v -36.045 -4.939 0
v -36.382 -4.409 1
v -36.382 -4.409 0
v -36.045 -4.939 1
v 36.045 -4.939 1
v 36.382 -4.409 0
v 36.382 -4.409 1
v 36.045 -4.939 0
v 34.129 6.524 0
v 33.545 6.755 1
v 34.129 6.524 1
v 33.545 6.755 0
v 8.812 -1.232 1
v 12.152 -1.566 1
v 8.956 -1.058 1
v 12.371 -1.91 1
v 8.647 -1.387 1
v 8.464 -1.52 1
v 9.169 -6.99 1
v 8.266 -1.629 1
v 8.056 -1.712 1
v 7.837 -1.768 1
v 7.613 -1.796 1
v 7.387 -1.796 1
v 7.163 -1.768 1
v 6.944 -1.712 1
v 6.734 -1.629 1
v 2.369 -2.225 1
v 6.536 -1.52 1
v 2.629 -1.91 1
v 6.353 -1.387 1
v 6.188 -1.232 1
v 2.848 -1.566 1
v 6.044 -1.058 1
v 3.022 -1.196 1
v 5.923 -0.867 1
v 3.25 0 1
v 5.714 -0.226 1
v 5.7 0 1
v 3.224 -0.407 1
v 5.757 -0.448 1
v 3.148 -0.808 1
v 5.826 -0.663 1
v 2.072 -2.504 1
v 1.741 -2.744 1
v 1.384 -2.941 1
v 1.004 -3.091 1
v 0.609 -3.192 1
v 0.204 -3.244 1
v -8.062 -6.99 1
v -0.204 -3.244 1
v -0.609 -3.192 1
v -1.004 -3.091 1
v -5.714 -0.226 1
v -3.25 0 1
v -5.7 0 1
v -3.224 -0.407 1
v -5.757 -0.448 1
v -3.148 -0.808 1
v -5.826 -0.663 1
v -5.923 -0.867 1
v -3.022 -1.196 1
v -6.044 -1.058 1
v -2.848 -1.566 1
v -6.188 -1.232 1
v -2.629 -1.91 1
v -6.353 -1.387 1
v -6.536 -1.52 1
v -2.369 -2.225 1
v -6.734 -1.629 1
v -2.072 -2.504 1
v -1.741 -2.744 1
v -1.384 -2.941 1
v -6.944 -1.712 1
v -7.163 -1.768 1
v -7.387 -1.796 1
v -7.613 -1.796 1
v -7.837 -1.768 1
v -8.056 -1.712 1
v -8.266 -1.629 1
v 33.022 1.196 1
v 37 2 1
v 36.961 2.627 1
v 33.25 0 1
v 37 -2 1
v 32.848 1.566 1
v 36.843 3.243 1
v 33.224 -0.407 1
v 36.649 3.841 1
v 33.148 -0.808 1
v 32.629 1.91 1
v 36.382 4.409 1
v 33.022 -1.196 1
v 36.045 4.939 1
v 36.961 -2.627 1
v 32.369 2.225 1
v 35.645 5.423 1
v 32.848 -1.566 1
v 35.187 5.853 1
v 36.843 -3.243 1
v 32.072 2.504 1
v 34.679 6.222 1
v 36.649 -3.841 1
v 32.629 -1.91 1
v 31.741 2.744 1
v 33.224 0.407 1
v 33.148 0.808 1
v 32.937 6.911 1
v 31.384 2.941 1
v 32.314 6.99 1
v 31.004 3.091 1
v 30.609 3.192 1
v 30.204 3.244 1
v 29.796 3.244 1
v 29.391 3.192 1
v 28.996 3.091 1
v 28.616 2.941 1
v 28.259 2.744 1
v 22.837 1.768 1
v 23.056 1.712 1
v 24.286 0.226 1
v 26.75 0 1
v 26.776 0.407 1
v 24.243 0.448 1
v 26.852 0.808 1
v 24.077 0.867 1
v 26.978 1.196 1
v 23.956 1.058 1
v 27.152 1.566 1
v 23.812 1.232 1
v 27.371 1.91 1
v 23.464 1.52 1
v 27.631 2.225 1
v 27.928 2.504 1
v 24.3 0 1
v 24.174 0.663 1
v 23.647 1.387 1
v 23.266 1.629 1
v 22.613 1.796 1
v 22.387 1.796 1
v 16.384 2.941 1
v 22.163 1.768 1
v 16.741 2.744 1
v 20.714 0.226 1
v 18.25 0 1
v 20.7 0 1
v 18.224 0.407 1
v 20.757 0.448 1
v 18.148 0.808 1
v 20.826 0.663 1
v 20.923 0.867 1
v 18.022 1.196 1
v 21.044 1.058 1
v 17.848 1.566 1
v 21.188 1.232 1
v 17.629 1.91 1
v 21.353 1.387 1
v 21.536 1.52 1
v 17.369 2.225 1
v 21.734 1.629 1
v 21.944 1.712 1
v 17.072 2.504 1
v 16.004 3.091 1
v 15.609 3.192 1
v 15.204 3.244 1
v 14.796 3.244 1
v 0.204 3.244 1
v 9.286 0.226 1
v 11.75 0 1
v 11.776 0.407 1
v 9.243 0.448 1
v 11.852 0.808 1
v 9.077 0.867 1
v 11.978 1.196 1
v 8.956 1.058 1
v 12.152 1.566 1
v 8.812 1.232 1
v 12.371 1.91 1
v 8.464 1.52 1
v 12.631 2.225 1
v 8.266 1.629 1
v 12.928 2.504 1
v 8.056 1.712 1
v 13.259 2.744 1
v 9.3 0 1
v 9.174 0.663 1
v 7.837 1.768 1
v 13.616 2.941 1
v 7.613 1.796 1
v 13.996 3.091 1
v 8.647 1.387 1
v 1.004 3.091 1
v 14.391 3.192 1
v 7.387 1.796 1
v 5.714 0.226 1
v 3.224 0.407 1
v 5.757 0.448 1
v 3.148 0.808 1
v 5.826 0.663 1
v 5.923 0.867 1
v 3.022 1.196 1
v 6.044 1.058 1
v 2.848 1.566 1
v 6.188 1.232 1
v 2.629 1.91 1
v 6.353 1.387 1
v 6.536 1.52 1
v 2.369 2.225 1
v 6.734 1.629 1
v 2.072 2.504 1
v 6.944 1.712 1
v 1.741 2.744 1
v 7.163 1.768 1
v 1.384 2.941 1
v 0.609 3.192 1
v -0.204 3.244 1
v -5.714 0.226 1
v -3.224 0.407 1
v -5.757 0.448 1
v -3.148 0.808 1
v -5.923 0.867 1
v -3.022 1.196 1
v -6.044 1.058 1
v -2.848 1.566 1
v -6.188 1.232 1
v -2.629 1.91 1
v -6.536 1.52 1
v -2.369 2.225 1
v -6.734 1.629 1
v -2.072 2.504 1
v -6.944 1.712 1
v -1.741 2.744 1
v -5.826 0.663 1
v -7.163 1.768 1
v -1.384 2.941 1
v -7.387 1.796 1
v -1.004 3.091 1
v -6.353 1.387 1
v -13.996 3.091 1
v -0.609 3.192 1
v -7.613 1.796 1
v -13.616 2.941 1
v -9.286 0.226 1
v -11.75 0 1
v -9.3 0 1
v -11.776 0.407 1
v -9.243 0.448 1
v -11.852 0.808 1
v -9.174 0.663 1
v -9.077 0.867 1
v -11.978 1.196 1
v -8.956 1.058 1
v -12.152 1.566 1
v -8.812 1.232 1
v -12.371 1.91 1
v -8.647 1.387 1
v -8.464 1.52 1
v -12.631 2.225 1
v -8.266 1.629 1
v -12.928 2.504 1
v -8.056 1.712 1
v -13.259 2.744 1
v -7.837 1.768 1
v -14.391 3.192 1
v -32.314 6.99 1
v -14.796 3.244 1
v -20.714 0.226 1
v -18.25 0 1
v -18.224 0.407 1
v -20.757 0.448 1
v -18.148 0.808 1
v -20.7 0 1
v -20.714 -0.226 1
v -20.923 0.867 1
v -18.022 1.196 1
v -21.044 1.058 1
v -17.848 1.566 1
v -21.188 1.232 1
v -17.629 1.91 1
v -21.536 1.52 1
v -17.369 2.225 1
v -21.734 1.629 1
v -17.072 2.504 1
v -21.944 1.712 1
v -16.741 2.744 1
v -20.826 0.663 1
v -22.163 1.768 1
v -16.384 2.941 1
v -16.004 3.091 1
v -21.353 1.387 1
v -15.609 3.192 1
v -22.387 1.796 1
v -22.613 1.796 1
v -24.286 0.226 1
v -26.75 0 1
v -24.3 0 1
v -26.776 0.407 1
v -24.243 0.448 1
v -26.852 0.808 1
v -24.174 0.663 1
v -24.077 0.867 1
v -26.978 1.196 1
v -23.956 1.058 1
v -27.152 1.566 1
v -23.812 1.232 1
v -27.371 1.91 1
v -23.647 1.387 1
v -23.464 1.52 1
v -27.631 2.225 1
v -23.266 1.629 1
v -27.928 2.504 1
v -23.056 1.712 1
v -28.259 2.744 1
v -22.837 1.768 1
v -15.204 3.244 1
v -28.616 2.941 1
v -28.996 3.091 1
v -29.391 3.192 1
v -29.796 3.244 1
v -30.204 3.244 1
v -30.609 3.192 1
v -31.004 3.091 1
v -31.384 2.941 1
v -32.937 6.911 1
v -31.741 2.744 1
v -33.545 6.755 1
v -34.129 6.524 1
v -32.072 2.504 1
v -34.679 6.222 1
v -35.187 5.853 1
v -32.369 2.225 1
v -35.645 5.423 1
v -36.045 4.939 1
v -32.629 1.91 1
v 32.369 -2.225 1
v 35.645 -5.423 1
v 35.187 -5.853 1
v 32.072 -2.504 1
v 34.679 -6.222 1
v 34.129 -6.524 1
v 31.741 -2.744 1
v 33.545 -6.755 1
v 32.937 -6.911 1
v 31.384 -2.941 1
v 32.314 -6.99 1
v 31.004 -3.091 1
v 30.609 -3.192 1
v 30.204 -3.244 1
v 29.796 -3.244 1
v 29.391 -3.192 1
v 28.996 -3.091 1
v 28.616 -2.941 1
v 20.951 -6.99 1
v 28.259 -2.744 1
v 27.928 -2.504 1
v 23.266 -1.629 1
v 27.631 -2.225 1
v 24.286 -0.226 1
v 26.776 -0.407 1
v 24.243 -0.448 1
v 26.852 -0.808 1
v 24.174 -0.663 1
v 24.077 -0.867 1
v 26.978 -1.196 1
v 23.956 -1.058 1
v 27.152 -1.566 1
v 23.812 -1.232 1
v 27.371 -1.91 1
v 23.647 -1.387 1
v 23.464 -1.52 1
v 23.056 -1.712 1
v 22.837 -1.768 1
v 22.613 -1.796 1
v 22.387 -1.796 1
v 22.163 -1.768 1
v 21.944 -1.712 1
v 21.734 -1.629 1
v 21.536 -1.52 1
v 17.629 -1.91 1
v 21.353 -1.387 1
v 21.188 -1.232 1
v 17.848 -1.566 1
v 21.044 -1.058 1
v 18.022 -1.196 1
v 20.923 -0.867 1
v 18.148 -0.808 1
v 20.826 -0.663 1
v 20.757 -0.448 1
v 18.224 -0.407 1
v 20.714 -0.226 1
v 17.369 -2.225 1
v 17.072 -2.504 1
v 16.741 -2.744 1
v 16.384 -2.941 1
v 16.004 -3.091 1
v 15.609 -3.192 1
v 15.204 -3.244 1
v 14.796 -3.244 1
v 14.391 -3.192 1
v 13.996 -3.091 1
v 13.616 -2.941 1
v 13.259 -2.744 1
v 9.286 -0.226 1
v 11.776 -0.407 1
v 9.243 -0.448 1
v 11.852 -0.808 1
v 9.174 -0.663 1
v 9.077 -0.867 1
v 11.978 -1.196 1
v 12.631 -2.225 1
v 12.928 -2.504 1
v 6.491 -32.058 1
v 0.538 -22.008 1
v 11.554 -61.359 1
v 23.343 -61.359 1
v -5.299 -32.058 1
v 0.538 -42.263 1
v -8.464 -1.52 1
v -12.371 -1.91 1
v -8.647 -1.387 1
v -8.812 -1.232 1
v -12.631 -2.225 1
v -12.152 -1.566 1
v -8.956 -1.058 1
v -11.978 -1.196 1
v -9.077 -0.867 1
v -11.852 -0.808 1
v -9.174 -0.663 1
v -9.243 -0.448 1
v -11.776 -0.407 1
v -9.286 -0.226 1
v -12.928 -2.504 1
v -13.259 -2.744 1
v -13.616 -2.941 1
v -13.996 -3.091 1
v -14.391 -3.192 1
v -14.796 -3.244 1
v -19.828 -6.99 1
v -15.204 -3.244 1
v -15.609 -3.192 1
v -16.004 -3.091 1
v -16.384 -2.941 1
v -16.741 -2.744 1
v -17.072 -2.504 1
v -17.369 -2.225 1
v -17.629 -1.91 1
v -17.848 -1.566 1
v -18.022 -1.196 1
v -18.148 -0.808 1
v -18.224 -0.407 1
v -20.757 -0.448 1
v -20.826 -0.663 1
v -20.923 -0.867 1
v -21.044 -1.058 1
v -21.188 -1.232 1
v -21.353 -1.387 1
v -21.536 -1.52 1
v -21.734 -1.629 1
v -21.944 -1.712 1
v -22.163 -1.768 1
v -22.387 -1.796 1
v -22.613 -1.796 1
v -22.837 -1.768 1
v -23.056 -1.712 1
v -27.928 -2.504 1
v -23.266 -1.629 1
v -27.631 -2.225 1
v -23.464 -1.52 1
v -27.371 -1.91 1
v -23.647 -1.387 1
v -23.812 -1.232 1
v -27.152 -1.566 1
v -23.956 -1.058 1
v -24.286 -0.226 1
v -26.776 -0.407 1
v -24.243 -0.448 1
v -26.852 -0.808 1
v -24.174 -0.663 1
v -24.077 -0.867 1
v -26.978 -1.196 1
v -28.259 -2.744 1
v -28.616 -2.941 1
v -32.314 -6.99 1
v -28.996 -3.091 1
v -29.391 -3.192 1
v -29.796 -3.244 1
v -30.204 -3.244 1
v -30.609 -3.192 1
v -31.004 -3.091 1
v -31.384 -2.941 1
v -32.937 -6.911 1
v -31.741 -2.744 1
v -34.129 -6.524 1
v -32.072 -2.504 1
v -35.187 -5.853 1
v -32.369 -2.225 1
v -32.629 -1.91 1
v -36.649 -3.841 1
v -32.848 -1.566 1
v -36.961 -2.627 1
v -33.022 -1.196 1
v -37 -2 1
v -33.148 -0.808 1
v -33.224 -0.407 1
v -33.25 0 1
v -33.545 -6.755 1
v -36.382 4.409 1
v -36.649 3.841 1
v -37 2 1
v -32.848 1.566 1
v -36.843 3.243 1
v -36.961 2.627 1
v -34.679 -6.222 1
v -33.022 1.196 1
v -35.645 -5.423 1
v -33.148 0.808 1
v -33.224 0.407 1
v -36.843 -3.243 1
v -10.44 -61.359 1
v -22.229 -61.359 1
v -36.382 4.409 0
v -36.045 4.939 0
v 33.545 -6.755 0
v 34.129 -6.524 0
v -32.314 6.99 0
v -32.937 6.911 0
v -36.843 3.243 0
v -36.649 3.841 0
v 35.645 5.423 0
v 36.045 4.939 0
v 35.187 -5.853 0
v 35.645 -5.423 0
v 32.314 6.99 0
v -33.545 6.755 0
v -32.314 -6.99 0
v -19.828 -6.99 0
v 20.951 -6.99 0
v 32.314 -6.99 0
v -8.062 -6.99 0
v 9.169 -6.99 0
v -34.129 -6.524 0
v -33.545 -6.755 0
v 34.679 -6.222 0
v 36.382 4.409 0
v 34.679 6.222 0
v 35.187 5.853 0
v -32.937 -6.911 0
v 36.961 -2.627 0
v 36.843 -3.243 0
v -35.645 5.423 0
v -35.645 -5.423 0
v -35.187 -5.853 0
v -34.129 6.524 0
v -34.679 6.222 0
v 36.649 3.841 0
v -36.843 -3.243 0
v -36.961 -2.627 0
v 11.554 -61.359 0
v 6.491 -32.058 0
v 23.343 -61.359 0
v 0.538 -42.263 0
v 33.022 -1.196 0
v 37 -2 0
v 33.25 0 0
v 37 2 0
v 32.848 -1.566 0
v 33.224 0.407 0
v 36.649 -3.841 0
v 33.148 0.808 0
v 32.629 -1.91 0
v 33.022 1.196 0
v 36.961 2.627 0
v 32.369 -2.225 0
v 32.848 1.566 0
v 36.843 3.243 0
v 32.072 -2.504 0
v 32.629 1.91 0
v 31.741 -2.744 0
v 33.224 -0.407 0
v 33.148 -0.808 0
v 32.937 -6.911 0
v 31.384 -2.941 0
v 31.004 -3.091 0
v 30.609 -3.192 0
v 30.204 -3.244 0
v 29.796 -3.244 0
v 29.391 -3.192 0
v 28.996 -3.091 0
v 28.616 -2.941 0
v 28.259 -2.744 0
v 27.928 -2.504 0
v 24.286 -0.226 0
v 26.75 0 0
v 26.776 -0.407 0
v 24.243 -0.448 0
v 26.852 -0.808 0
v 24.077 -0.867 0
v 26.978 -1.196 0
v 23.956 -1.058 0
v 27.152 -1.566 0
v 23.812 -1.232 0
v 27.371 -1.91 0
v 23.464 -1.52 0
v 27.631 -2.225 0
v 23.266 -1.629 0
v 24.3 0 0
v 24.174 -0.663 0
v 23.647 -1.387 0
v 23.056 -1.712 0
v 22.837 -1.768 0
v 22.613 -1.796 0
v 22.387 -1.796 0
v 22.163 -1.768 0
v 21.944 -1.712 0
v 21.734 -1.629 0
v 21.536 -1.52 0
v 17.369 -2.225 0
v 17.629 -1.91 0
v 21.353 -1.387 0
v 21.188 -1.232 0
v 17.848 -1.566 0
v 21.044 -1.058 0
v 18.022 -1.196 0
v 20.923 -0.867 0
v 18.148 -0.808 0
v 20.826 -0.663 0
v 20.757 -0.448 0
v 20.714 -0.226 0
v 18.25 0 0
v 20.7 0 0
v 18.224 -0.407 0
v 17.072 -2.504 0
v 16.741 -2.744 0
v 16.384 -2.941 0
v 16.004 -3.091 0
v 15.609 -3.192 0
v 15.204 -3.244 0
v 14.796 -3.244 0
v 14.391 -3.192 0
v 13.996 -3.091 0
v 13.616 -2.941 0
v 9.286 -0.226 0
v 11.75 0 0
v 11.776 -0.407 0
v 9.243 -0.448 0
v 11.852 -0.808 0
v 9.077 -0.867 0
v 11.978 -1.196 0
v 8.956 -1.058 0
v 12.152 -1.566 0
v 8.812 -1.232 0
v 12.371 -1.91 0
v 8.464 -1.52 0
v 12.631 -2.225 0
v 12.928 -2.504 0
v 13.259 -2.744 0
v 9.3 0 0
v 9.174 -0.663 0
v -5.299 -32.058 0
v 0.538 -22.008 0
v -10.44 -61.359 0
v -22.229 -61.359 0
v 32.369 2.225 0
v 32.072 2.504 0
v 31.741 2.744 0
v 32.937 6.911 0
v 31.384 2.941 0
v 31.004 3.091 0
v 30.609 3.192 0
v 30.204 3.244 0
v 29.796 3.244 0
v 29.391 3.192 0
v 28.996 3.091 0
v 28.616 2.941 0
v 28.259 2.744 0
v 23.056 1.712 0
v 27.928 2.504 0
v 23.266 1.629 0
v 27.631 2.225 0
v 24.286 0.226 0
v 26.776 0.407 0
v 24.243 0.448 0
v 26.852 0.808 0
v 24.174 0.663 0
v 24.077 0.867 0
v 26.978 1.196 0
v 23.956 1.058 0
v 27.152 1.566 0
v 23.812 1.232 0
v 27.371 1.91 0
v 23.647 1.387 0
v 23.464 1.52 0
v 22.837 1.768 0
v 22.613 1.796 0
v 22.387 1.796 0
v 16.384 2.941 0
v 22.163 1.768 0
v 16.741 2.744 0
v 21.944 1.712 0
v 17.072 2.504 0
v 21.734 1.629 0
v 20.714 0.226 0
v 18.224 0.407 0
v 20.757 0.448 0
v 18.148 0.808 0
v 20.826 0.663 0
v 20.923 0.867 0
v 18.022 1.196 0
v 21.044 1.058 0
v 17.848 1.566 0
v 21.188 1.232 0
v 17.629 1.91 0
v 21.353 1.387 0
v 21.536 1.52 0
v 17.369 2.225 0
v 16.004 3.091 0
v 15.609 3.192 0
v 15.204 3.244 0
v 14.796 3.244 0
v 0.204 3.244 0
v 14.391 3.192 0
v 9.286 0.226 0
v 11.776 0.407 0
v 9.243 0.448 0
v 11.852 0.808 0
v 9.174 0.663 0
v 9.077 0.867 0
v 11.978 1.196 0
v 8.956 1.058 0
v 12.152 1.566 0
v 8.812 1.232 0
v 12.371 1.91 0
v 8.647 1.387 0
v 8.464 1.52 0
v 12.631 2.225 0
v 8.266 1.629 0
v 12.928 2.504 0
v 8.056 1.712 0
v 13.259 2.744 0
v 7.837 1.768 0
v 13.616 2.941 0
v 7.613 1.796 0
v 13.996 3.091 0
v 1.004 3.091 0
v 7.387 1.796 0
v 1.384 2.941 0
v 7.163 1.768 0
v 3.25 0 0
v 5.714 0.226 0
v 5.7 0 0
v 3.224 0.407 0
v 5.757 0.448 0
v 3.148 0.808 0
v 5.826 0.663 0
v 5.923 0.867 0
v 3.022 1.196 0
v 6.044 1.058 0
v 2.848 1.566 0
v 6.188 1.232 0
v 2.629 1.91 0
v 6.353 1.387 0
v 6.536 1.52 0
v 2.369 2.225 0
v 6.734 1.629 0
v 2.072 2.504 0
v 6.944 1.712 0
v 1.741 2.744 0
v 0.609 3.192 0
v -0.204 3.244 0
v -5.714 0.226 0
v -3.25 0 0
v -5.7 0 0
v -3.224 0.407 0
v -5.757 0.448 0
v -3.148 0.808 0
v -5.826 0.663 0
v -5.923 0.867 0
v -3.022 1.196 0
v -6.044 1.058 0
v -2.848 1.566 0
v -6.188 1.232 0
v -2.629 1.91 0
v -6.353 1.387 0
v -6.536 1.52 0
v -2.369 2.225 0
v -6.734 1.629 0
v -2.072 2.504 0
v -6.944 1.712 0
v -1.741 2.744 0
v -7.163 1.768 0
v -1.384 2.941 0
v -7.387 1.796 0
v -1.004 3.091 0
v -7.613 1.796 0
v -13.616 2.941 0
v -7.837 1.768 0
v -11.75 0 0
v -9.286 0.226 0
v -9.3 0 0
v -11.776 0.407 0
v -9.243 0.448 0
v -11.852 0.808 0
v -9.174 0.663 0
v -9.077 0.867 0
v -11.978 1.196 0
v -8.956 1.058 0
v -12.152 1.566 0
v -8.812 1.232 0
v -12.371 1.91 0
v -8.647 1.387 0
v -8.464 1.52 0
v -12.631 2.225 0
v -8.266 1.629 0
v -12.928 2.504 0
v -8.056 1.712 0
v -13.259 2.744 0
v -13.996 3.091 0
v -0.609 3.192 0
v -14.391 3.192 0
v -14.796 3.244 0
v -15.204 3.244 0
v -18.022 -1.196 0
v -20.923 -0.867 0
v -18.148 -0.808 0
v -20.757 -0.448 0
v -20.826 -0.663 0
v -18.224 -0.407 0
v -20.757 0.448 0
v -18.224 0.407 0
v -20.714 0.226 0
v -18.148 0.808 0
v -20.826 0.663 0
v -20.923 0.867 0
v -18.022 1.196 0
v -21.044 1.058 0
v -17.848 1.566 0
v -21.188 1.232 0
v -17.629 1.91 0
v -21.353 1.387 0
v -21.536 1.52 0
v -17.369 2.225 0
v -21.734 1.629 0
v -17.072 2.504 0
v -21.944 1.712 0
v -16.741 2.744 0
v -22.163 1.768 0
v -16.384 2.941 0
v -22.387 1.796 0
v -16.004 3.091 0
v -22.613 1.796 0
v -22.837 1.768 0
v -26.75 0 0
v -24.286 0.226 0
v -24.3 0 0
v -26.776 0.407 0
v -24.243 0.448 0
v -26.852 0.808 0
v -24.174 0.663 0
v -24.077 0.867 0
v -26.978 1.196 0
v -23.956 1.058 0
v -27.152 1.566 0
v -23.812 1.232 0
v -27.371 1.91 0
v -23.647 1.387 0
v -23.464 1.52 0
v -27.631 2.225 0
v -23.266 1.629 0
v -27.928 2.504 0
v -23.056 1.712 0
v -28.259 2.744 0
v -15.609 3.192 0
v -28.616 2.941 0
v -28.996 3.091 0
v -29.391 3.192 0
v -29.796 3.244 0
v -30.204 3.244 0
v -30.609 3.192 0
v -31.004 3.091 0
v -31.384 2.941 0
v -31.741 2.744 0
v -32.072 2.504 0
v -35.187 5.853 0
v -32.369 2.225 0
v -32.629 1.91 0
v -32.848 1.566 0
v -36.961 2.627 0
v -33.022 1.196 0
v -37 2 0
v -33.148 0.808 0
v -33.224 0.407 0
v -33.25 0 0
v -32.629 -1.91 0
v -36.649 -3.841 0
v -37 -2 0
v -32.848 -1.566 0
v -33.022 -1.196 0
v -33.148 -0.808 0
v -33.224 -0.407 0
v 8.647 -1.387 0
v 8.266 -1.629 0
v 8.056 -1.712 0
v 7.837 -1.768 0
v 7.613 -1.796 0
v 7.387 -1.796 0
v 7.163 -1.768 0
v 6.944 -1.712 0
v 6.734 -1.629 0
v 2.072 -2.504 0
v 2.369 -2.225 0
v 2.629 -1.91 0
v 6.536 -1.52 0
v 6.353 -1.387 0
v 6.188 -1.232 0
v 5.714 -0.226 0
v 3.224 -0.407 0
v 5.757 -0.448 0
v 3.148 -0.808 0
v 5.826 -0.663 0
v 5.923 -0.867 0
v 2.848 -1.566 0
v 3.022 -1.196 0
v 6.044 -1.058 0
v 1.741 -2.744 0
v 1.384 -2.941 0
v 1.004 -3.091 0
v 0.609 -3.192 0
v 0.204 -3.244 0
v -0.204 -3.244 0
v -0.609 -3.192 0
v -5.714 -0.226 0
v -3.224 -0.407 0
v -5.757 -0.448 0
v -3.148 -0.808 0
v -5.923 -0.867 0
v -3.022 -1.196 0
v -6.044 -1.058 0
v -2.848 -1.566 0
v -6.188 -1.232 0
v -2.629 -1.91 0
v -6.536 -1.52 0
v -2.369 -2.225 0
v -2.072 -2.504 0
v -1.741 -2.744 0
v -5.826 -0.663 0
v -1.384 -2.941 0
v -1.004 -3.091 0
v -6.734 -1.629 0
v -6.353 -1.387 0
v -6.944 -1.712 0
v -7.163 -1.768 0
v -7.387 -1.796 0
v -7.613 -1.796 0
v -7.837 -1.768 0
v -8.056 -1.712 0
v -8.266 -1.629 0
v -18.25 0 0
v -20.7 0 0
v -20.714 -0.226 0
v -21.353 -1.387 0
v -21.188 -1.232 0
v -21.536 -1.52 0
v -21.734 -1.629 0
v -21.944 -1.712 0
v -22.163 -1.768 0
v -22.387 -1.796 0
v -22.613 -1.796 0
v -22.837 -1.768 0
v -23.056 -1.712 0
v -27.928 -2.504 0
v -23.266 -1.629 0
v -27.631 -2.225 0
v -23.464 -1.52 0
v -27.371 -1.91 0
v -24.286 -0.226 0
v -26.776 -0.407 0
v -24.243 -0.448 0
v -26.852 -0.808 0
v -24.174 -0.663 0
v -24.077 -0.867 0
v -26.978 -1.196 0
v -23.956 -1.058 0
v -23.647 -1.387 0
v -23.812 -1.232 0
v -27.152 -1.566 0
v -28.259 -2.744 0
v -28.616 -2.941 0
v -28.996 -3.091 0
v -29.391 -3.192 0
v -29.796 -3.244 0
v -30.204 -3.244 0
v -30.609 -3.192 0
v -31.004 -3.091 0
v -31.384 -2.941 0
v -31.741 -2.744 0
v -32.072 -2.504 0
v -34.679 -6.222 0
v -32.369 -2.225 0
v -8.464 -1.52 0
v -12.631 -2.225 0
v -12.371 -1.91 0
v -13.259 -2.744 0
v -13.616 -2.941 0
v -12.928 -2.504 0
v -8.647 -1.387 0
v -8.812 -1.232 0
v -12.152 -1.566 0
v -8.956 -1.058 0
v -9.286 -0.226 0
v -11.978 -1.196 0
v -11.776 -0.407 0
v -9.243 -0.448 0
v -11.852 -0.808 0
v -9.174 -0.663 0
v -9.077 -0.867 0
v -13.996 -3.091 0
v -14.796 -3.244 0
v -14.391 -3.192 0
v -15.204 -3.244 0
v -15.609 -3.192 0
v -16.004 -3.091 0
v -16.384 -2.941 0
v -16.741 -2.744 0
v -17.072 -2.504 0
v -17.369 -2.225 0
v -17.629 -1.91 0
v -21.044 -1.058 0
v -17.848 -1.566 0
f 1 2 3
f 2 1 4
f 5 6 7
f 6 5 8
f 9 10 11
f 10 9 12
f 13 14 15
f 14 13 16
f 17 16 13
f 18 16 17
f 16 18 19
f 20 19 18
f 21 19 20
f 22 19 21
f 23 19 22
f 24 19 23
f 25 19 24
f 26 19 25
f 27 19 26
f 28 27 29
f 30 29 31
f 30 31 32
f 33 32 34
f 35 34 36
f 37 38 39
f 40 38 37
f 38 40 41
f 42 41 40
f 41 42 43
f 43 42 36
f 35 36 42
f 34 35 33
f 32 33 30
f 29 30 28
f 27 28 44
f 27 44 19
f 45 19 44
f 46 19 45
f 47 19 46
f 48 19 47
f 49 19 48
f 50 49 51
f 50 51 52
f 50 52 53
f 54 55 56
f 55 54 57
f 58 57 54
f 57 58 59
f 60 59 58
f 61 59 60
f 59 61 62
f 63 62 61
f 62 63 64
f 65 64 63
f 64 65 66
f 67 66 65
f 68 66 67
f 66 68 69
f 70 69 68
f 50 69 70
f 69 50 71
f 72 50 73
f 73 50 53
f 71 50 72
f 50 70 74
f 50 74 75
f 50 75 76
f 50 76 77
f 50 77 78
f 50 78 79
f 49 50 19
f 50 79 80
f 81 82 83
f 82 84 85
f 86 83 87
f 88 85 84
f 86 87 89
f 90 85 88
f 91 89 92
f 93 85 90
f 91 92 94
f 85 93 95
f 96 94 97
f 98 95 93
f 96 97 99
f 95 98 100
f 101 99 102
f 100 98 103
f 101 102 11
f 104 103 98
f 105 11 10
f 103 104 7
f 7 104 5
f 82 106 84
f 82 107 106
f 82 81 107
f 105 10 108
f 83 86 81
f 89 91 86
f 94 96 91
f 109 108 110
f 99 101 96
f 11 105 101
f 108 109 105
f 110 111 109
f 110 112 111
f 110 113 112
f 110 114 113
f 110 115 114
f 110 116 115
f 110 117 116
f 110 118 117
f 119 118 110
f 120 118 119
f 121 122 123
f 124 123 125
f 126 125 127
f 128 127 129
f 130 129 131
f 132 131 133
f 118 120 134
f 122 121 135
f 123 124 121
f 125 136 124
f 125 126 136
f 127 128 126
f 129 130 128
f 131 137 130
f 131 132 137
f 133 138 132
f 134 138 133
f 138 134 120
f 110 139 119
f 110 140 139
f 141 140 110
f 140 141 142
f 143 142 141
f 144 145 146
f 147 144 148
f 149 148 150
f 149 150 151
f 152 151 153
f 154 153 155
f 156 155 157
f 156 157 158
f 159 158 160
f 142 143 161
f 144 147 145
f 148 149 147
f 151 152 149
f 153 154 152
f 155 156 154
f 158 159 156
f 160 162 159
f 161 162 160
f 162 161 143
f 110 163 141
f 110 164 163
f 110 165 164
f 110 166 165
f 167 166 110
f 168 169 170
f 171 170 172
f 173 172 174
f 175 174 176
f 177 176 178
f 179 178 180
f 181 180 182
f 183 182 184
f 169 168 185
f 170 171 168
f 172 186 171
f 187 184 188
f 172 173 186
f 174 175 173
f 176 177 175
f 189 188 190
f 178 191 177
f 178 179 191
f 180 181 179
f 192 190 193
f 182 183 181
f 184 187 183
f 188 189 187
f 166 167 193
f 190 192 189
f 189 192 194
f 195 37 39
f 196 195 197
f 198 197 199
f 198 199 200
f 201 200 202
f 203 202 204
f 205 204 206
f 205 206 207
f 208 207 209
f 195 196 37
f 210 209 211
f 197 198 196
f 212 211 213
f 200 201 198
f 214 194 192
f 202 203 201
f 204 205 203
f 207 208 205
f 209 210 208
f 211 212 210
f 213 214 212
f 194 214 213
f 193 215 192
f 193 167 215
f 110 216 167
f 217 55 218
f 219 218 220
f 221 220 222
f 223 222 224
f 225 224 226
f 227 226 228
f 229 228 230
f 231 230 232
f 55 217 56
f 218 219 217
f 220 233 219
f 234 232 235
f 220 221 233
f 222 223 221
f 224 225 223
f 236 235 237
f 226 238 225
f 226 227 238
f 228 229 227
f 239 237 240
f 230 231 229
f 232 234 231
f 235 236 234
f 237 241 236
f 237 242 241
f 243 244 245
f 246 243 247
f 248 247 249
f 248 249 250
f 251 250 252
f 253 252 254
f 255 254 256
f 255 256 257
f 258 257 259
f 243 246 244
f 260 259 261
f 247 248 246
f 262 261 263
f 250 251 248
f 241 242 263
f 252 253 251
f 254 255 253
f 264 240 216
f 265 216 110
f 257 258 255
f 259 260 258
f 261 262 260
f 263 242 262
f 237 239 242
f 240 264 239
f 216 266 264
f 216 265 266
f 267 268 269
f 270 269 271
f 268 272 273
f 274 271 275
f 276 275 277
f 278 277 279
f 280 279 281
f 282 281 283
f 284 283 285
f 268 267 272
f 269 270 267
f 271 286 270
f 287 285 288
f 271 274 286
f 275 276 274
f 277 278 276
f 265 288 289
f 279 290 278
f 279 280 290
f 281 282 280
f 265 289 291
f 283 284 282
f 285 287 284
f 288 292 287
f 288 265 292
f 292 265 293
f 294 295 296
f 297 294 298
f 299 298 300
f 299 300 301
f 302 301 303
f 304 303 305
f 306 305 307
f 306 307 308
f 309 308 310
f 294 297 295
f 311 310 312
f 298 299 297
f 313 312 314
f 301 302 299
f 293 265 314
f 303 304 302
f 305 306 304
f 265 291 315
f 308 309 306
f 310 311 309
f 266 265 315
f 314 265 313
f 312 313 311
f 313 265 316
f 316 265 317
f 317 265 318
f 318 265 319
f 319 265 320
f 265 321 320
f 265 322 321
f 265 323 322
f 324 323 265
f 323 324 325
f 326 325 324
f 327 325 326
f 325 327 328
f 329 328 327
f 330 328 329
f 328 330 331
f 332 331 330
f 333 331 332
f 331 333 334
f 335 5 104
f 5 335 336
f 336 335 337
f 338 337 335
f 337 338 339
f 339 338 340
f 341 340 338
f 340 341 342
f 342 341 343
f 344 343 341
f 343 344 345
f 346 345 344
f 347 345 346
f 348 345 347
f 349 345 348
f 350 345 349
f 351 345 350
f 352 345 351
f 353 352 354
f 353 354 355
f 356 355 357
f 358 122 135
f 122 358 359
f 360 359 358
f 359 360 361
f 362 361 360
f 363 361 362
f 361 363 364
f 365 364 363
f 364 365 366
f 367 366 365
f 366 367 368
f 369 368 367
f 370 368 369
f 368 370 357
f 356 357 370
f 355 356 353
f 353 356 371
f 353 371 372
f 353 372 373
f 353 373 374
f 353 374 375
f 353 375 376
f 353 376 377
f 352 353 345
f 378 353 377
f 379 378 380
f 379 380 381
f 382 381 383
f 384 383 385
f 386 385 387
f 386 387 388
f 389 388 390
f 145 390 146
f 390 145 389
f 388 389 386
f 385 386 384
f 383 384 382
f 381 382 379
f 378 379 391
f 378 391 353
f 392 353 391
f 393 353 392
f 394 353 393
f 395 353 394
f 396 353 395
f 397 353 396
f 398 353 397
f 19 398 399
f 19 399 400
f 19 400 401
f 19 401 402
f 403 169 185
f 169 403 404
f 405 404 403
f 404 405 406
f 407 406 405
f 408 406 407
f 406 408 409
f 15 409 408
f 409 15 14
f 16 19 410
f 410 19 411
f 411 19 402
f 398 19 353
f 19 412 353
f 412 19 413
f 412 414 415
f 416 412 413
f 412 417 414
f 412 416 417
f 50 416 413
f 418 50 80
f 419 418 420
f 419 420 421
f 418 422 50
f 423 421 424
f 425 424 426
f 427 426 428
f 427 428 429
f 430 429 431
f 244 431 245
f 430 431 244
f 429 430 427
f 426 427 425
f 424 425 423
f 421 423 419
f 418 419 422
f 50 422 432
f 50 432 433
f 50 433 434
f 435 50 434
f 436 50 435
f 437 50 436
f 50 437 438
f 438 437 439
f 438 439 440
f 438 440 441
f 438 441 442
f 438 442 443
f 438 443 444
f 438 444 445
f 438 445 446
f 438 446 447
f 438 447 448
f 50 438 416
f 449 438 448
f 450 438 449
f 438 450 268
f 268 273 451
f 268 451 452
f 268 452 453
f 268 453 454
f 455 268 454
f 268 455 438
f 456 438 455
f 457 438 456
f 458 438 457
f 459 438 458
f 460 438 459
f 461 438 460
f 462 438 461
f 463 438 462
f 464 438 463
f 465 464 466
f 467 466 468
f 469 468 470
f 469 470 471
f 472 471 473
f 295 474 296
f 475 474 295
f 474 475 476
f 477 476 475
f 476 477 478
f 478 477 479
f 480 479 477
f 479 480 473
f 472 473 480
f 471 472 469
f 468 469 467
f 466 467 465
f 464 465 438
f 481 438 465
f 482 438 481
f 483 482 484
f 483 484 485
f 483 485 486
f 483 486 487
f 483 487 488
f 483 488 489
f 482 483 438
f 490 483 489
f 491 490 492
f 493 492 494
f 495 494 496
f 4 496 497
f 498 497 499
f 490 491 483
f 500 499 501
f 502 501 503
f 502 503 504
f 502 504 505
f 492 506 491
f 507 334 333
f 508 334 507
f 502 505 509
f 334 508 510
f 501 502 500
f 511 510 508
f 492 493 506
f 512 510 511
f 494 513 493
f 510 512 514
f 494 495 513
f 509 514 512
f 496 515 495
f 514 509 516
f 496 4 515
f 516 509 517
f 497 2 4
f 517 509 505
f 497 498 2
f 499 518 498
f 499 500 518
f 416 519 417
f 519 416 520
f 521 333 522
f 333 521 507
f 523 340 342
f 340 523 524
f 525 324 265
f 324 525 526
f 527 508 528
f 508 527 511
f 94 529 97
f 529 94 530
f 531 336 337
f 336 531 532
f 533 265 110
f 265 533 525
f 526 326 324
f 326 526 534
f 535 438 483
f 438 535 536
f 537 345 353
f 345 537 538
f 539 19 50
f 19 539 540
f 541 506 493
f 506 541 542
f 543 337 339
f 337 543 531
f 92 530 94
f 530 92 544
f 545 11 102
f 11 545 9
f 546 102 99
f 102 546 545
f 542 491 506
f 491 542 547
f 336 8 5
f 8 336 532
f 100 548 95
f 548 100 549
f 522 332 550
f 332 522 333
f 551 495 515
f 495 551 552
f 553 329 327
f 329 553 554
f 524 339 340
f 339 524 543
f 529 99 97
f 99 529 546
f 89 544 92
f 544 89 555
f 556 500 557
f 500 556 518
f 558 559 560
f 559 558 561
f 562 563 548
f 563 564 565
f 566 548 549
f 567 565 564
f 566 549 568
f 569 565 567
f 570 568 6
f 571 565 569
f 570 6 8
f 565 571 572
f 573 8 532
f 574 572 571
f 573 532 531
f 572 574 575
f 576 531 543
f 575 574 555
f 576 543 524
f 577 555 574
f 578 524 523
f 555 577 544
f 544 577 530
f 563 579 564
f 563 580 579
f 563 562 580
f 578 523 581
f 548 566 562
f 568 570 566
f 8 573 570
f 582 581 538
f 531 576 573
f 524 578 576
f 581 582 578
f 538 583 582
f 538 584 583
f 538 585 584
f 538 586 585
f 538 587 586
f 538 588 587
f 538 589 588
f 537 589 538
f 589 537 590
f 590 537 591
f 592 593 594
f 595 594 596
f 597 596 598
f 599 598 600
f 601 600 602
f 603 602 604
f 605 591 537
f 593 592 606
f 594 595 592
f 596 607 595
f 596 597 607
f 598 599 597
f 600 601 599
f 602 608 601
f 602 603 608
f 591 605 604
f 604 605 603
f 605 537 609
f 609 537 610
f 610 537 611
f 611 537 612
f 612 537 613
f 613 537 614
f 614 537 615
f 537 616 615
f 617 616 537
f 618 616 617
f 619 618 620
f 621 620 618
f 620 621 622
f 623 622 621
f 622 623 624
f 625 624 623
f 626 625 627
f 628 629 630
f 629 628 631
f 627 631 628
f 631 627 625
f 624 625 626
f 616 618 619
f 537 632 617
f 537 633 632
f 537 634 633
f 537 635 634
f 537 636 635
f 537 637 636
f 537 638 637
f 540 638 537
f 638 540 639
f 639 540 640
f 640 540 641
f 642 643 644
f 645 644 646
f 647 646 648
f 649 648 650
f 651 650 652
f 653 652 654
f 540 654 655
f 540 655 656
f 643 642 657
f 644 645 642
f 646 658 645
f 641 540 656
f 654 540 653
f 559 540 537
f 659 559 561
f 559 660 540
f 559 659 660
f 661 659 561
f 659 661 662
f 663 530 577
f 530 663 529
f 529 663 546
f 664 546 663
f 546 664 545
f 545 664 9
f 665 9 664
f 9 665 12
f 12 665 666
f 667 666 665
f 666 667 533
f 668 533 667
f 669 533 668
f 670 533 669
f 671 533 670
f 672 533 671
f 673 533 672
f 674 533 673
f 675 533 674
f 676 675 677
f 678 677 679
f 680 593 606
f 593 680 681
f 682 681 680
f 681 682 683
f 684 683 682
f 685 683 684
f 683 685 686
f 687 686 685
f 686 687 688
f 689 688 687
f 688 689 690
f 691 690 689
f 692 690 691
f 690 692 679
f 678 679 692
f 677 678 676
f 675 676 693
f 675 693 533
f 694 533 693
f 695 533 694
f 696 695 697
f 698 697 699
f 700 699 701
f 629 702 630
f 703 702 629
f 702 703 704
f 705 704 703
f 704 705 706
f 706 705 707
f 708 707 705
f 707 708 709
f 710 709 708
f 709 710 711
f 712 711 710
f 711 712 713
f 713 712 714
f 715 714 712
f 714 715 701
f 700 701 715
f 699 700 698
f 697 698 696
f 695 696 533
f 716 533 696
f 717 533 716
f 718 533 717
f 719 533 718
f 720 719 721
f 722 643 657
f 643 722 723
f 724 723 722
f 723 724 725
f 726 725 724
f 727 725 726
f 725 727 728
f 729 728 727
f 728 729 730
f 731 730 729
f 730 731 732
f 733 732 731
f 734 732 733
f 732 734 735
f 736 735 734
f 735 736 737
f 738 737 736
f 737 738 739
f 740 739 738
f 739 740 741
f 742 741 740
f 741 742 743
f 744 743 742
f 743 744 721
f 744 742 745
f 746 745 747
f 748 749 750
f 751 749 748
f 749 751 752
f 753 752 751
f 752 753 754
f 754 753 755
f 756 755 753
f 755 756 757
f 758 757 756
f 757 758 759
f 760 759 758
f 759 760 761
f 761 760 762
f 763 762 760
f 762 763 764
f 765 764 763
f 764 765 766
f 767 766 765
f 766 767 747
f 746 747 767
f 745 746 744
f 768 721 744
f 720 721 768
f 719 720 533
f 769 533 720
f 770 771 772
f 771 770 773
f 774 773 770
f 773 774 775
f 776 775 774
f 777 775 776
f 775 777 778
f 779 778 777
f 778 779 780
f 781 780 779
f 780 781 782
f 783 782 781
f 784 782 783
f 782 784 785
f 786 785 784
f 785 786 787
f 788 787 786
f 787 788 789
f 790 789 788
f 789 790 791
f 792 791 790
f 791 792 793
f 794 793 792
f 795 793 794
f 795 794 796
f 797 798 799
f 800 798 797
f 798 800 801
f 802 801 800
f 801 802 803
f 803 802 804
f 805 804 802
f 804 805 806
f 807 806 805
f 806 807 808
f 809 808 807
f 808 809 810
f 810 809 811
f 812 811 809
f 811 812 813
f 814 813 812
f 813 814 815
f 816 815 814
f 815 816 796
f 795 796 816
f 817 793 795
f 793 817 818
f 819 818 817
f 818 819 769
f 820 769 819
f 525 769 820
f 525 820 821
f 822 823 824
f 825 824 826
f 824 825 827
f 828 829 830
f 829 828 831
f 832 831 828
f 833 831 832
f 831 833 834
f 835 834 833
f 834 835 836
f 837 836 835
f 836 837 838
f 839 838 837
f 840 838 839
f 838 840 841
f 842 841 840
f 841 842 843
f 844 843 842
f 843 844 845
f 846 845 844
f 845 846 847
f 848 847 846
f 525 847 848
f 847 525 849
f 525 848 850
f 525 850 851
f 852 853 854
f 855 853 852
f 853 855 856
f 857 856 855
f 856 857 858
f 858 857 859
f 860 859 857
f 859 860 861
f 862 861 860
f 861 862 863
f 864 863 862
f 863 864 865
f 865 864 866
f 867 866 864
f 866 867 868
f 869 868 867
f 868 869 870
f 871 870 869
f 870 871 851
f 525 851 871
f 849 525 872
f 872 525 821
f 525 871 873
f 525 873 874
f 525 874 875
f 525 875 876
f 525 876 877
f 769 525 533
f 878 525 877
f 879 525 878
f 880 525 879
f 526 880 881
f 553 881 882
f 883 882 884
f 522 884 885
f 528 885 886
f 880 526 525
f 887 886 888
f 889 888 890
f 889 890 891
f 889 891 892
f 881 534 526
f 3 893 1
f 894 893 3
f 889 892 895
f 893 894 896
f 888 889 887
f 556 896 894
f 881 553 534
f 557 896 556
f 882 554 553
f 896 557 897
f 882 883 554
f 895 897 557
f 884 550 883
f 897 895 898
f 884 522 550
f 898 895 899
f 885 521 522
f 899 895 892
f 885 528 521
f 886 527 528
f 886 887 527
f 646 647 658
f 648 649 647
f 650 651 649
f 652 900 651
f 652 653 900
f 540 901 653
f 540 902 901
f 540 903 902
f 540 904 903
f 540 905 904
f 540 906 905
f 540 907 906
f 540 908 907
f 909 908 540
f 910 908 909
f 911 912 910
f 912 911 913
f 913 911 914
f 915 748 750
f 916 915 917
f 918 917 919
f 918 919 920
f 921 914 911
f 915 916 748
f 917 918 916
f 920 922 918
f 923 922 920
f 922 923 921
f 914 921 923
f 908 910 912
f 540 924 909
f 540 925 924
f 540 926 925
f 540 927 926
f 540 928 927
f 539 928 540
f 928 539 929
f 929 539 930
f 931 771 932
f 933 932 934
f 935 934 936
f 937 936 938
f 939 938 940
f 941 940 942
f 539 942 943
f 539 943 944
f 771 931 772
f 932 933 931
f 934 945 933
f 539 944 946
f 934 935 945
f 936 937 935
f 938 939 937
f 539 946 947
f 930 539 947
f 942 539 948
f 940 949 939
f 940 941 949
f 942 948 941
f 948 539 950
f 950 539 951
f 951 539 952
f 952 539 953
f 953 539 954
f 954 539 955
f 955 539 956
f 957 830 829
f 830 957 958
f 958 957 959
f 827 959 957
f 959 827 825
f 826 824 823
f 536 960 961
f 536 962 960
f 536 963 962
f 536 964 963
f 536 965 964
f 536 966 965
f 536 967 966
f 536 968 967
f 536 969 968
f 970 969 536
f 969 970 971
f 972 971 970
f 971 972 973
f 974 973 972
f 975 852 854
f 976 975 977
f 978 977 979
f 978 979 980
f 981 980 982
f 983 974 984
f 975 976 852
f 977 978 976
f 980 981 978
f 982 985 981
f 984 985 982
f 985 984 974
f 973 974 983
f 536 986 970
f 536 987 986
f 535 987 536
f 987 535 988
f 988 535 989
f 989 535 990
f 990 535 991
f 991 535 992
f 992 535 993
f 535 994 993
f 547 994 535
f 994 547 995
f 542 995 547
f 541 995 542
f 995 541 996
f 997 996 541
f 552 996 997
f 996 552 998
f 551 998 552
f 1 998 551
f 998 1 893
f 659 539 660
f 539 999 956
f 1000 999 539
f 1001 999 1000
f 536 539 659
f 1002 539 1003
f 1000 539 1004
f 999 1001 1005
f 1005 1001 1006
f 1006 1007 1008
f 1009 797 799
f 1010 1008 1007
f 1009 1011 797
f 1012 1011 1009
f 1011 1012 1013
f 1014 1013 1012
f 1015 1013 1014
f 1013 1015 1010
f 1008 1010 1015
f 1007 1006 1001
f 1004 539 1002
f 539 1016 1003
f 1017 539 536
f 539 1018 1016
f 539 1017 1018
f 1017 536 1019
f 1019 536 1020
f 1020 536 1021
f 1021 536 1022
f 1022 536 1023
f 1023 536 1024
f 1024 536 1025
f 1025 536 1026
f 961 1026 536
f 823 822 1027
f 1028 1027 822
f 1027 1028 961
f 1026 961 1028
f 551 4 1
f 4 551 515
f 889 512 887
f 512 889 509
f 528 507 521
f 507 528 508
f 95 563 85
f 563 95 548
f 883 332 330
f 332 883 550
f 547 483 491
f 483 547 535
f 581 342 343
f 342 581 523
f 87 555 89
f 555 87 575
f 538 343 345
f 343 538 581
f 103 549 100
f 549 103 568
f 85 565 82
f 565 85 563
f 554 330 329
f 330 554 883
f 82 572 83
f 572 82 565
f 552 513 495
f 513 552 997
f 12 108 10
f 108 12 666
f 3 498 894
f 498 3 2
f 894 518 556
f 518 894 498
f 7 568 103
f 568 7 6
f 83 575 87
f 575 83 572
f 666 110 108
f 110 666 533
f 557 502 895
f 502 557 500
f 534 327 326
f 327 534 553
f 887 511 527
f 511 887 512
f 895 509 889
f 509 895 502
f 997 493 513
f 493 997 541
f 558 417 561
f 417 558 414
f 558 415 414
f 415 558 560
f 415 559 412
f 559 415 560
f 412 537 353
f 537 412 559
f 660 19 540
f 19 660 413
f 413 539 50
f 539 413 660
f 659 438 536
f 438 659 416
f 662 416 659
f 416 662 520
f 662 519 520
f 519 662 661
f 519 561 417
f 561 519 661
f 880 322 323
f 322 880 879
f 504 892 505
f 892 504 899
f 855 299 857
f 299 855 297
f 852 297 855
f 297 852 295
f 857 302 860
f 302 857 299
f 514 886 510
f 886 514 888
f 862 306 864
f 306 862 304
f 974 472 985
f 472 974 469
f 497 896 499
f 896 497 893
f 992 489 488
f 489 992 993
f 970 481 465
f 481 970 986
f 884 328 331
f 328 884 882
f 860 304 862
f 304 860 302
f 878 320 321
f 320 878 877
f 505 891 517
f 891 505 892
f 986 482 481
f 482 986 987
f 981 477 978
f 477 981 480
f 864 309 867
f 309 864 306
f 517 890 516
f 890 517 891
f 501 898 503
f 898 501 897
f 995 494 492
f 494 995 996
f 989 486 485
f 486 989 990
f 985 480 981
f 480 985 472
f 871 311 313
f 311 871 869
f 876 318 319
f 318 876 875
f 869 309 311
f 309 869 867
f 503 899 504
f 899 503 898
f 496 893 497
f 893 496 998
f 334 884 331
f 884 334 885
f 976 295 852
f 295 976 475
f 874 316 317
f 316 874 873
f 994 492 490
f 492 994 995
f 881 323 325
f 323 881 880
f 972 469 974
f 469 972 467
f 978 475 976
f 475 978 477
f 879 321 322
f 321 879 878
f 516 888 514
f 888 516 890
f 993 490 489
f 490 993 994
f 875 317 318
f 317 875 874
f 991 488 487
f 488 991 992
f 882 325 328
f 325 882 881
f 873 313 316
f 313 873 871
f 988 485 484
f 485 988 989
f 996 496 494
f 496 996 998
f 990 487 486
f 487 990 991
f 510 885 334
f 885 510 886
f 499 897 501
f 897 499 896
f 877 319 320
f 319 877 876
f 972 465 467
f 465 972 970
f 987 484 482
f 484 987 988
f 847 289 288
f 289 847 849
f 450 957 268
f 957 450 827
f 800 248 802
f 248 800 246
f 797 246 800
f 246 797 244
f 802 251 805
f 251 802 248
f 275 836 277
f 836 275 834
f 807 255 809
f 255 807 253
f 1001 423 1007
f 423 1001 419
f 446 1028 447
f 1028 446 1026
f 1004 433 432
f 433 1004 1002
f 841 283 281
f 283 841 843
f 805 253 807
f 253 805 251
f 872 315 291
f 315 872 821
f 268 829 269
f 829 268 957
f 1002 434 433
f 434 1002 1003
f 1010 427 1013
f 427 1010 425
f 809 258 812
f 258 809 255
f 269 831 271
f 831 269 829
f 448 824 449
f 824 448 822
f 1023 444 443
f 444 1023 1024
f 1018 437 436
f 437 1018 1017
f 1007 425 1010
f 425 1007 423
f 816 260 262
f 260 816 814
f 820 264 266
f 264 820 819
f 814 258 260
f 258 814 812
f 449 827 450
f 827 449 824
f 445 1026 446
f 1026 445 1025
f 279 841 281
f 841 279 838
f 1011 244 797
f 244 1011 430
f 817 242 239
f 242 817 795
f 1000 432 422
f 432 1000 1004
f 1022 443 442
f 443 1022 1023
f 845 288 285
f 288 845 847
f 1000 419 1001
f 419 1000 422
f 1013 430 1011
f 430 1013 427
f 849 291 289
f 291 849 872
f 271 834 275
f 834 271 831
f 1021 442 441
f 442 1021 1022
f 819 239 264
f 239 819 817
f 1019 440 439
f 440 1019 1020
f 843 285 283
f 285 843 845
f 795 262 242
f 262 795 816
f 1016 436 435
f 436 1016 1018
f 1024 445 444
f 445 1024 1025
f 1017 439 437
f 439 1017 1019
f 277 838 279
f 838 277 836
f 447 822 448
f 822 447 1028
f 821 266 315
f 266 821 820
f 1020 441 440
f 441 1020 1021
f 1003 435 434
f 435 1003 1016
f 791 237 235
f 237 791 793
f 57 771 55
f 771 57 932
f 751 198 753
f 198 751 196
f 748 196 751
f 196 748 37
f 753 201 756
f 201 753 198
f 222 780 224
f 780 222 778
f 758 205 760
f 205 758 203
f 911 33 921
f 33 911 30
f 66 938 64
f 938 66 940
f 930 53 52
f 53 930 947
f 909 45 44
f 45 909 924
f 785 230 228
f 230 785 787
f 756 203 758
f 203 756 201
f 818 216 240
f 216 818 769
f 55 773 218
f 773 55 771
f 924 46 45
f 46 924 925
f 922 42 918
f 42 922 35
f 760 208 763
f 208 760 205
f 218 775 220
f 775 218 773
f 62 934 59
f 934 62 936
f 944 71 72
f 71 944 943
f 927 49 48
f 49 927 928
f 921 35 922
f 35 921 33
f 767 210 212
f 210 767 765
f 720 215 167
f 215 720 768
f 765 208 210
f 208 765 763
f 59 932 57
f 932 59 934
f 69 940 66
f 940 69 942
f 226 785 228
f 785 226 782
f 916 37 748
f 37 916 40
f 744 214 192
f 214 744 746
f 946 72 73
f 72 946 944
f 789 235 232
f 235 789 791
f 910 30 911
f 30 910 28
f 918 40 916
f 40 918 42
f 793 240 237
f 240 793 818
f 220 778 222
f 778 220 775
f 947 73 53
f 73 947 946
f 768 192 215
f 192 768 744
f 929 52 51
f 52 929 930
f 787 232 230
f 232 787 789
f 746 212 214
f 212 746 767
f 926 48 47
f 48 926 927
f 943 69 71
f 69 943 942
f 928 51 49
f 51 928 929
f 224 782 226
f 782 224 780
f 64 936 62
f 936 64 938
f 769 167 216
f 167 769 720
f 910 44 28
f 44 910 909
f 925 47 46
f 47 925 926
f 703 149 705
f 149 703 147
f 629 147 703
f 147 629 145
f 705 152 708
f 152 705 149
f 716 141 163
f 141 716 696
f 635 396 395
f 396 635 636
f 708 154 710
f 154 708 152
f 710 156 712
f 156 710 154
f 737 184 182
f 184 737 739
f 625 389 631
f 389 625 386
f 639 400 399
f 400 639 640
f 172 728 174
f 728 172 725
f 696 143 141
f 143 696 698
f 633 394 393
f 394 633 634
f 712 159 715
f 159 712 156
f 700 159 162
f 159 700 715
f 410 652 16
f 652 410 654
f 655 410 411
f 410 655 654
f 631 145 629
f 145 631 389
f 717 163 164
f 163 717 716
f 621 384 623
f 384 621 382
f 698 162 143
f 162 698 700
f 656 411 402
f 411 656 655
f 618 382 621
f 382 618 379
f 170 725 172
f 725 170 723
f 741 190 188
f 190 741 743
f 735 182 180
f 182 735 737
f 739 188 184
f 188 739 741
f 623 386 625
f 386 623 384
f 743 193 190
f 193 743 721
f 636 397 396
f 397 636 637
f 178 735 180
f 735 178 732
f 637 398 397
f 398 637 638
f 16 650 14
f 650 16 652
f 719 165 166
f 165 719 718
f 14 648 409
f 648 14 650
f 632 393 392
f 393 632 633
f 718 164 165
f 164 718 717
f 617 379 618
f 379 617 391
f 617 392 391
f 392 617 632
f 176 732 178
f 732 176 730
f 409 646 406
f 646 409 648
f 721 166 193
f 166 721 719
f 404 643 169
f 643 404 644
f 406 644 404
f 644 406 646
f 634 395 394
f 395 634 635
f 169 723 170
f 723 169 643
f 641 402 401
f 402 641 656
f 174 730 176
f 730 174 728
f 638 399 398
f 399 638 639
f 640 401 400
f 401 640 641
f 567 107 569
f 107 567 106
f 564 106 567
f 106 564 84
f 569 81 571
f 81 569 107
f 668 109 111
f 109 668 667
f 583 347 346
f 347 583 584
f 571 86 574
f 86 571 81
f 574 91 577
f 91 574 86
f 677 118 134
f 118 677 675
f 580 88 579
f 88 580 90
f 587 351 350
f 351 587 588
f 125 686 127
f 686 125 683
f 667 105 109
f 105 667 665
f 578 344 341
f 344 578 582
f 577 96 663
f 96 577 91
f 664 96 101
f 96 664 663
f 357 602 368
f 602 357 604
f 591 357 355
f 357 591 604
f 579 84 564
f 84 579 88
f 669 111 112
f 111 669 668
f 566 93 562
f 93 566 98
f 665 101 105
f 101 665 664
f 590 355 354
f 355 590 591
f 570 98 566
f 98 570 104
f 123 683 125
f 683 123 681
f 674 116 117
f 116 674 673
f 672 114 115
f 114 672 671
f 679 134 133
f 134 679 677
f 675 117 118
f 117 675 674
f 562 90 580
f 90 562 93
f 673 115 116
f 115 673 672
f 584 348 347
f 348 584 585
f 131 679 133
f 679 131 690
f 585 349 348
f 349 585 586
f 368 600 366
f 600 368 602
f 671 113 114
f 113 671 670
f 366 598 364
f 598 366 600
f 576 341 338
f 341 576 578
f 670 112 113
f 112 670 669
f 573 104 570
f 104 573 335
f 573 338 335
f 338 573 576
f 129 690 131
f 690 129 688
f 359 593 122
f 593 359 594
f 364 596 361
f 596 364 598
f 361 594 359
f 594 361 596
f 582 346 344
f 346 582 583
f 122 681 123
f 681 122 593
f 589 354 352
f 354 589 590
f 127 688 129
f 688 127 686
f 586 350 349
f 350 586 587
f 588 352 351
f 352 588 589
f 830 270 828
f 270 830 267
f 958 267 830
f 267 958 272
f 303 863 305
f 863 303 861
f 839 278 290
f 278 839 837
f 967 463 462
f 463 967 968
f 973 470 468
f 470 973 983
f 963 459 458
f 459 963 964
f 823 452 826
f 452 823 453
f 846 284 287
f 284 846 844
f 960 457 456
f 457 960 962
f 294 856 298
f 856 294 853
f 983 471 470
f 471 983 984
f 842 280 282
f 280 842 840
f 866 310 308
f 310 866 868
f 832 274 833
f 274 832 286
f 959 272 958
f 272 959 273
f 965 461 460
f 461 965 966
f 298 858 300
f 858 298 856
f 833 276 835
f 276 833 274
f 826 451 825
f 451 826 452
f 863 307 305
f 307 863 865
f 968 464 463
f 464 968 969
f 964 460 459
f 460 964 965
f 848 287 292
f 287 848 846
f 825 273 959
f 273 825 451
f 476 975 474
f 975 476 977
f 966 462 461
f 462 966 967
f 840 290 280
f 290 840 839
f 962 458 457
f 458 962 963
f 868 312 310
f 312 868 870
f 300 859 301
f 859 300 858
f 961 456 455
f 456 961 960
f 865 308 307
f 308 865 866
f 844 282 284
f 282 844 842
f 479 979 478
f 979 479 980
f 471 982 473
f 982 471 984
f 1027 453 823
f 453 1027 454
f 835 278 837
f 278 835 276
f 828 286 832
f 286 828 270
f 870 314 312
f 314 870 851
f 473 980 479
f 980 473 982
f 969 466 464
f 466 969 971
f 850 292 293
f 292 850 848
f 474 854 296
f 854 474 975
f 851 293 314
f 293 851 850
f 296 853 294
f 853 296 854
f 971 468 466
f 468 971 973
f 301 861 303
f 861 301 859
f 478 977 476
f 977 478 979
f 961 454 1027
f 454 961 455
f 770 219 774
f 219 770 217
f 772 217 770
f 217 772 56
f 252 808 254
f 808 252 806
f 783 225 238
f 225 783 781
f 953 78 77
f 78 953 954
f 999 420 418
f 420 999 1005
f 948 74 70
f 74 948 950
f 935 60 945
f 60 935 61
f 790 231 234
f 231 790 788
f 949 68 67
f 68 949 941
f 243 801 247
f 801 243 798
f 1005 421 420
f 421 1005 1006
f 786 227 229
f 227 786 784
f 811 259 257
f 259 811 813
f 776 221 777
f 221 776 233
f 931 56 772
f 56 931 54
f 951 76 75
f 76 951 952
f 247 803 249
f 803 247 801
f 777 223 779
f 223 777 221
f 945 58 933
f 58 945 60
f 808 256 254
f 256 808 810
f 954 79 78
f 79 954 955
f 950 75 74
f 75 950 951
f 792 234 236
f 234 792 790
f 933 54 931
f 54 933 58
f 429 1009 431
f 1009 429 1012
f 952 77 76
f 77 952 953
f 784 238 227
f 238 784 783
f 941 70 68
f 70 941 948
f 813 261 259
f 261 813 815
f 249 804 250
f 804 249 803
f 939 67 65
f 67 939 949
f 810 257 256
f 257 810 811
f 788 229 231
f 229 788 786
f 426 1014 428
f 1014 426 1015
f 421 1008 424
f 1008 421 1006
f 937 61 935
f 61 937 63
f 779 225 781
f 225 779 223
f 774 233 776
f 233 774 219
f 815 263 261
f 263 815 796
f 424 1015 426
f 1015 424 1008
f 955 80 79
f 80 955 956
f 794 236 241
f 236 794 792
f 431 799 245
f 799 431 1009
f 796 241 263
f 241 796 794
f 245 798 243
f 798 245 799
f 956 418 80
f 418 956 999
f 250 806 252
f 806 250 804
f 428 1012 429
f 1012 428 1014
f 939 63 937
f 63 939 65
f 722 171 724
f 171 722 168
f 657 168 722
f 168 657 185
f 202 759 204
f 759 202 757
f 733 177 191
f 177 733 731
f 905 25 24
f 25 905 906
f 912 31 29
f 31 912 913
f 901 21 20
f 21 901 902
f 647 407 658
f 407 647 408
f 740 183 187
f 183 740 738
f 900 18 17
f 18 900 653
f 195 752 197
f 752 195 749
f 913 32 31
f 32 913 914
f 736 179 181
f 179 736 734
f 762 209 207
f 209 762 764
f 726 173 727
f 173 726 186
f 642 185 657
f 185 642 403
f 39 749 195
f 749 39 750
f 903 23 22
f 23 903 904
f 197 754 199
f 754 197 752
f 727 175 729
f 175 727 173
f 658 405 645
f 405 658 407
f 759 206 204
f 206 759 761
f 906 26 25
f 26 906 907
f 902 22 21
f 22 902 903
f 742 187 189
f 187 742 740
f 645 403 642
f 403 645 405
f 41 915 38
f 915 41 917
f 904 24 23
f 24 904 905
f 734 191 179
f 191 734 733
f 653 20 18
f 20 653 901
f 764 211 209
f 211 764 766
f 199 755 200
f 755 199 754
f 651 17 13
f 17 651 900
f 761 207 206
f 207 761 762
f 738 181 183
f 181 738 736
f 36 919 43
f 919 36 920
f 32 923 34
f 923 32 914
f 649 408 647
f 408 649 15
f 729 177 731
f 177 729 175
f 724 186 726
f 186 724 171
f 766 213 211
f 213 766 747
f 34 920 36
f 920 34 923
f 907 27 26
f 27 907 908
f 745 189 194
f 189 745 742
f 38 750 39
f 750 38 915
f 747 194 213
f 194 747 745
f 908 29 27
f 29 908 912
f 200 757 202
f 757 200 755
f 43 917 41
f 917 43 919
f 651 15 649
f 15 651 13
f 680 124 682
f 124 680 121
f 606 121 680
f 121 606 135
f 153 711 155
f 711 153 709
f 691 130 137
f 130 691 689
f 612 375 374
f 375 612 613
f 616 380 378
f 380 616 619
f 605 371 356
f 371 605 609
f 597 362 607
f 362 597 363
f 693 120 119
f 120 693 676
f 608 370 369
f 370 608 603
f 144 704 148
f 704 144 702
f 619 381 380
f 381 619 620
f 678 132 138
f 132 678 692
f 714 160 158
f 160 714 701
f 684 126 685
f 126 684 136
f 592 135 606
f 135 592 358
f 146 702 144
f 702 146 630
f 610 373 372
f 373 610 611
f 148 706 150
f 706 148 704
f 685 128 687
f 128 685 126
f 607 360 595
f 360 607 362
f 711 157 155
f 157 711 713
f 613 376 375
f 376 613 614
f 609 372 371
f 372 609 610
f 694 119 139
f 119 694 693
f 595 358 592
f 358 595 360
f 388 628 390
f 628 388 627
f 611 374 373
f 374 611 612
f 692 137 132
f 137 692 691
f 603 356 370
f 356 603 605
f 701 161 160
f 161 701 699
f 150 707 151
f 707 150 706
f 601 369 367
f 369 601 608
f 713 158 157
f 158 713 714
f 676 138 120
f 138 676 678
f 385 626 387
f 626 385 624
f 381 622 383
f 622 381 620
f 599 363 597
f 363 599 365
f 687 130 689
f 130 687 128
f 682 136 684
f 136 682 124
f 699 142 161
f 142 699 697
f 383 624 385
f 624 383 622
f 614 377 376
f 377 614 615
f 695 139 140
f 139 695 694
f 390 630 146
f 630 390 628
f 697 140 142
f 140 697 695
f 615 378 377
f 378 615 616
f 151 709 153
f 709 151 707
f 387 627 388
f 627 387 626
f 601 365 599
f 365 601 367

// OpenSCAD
$fn = 50;


difference() {
	union() {
		*color(alpha = 1.0000000000, c = "gray") {
			translate(v = [0, 14, 0]) {
				linear_extrude(height = 1) {
					text(font = "Arial:style=Bold", halign = "center", size = 4.5000000000, text = "COMMENT description oobb_plate_shape_p_type_1_depth_5_width_1_thickness_x_extra_oobb_size", valign = "center");
				}
			}
		}
		hull() {
			translate(v = [-32.0000000000, 2.0000000000, 0]) {
				cylinder(h = 1, r = 5);
			}
			translate(v = [32.0000000000, 2.0000000000, 0]) {
				cylinder(h = 1, r = 5);
			}
			translate(v = [-32.0000000000, -2.0000000000, 0]) {
				cylinder(h = 1, r = 5);
			}
			translate(v = [32.0000000000, -2.0000000000, 0]) {
				cylinder(h = 1, r = 5);
			}
		}
		translate(v = [0, -5, 0]) {
			linear_extrude(height = 1) {
				text(font = "DejaVu Sans Mono:style=Bold", halign = "center", size = 57.0000000000, text = "X", valign = "top");
			}
		}
	}
	union() {
		*color(alpha = 1.0000000000, c = "gray") {
			translate(v = [0, 14, 0]) {
				linear_extrude(height = 1) {
					text(font = "Arial:style=Bold", halign = "center", size = 4.5000000000, text = "COMMENT description oobb_holes_shape_n_type_5_width_1_thickness_x_extra_oobb_size_1_height_'all'_holes_true_both_holes", valign = "center");
				}
			}
		}
		translate(v = [-30.0000000000, 0.0000000000, 0]) {
			translate(v = [0, 0, -50]) {
				cylinder(h = 100, r = 3.2500000000);
			}
		}
		translate(v = [-15.0000000000, 0.0000000000, 0]) {
			translate(v = [0, 0, -50]) {
				cylinder(h = 100, r = 3.2500000000);
			}
		}
		translate(v = [0, 0, -50]) {
			cylinder(h = 100, r = 3.2500000000);
		}
		translate(v = [15.0000000000, 0.0000000000, 0]) {
			translate(v = [0, 0, -50]) {
				cylinder(h = 100, r = 3.2500000000);
			}
		}
		translate(v = [30.0000000000, 0.0000000000, 0]) {
			translate(v = [0, 0, -50]) {
				cylinder(h = 100, r = 3.2500000000);
			}
		}
		translate(v = [-30.0000000000, 0.0000000000, 0]) {
			translate(v = [0, 0, -50]) {
				cylinder(h = 100, r = 1.8000000000);
			}
		}
		translate(v = [-22.5000000000, 0.0000000000, 0]) {
			translate(v = [0, 0, -50]) {
				cylinder(h = 100, r = 1.8000000000);
			}
		}
		translate(v = [-15.0000000000, 0.0000000000, 0]) {
			translate(v = [0, 0, -50]) {
				cylinder(h = 100, r = 1.8000000000);
			}
		}
		translate(v = [-7.5000000000, 0.0000000000, 0]) {
			translate(v = [0, 0, -50]) {
				cylinder(h = 100, r = 1.8000000000);
			}
		}
		translate(v = [0, 0, -50]) {
			cylinder(h = 100, r = 1.8000000000);
		}
		translate(v = [7.5000000000, 0.0000000000, 0]) {
			translate(v = [0, 0, -50]) {
				cylinder(h = 100, r = 1.8000000000);
			}
		}
		translate(v = [15.0000000000, 0.0000000000, 0]) {
			translate(v = [0, 0, -50]) {
				cylinder(h = 100, r = 1.8000000000);
			}
		}
		translate(v = [22.5000000000, 0.0000000000, 0]) {
			translate(v = [0, 0, -50]) {
				cylinder(h = 100, r = 1.8000000000);
			}
		}
		translate(v = [30.0000000000, 0.0000000000, 0]) {
			translate(v = [0, 0, -50]) {
				cylinder(h = 100, r = 1.8000000000);
			}
		}
	}
}
